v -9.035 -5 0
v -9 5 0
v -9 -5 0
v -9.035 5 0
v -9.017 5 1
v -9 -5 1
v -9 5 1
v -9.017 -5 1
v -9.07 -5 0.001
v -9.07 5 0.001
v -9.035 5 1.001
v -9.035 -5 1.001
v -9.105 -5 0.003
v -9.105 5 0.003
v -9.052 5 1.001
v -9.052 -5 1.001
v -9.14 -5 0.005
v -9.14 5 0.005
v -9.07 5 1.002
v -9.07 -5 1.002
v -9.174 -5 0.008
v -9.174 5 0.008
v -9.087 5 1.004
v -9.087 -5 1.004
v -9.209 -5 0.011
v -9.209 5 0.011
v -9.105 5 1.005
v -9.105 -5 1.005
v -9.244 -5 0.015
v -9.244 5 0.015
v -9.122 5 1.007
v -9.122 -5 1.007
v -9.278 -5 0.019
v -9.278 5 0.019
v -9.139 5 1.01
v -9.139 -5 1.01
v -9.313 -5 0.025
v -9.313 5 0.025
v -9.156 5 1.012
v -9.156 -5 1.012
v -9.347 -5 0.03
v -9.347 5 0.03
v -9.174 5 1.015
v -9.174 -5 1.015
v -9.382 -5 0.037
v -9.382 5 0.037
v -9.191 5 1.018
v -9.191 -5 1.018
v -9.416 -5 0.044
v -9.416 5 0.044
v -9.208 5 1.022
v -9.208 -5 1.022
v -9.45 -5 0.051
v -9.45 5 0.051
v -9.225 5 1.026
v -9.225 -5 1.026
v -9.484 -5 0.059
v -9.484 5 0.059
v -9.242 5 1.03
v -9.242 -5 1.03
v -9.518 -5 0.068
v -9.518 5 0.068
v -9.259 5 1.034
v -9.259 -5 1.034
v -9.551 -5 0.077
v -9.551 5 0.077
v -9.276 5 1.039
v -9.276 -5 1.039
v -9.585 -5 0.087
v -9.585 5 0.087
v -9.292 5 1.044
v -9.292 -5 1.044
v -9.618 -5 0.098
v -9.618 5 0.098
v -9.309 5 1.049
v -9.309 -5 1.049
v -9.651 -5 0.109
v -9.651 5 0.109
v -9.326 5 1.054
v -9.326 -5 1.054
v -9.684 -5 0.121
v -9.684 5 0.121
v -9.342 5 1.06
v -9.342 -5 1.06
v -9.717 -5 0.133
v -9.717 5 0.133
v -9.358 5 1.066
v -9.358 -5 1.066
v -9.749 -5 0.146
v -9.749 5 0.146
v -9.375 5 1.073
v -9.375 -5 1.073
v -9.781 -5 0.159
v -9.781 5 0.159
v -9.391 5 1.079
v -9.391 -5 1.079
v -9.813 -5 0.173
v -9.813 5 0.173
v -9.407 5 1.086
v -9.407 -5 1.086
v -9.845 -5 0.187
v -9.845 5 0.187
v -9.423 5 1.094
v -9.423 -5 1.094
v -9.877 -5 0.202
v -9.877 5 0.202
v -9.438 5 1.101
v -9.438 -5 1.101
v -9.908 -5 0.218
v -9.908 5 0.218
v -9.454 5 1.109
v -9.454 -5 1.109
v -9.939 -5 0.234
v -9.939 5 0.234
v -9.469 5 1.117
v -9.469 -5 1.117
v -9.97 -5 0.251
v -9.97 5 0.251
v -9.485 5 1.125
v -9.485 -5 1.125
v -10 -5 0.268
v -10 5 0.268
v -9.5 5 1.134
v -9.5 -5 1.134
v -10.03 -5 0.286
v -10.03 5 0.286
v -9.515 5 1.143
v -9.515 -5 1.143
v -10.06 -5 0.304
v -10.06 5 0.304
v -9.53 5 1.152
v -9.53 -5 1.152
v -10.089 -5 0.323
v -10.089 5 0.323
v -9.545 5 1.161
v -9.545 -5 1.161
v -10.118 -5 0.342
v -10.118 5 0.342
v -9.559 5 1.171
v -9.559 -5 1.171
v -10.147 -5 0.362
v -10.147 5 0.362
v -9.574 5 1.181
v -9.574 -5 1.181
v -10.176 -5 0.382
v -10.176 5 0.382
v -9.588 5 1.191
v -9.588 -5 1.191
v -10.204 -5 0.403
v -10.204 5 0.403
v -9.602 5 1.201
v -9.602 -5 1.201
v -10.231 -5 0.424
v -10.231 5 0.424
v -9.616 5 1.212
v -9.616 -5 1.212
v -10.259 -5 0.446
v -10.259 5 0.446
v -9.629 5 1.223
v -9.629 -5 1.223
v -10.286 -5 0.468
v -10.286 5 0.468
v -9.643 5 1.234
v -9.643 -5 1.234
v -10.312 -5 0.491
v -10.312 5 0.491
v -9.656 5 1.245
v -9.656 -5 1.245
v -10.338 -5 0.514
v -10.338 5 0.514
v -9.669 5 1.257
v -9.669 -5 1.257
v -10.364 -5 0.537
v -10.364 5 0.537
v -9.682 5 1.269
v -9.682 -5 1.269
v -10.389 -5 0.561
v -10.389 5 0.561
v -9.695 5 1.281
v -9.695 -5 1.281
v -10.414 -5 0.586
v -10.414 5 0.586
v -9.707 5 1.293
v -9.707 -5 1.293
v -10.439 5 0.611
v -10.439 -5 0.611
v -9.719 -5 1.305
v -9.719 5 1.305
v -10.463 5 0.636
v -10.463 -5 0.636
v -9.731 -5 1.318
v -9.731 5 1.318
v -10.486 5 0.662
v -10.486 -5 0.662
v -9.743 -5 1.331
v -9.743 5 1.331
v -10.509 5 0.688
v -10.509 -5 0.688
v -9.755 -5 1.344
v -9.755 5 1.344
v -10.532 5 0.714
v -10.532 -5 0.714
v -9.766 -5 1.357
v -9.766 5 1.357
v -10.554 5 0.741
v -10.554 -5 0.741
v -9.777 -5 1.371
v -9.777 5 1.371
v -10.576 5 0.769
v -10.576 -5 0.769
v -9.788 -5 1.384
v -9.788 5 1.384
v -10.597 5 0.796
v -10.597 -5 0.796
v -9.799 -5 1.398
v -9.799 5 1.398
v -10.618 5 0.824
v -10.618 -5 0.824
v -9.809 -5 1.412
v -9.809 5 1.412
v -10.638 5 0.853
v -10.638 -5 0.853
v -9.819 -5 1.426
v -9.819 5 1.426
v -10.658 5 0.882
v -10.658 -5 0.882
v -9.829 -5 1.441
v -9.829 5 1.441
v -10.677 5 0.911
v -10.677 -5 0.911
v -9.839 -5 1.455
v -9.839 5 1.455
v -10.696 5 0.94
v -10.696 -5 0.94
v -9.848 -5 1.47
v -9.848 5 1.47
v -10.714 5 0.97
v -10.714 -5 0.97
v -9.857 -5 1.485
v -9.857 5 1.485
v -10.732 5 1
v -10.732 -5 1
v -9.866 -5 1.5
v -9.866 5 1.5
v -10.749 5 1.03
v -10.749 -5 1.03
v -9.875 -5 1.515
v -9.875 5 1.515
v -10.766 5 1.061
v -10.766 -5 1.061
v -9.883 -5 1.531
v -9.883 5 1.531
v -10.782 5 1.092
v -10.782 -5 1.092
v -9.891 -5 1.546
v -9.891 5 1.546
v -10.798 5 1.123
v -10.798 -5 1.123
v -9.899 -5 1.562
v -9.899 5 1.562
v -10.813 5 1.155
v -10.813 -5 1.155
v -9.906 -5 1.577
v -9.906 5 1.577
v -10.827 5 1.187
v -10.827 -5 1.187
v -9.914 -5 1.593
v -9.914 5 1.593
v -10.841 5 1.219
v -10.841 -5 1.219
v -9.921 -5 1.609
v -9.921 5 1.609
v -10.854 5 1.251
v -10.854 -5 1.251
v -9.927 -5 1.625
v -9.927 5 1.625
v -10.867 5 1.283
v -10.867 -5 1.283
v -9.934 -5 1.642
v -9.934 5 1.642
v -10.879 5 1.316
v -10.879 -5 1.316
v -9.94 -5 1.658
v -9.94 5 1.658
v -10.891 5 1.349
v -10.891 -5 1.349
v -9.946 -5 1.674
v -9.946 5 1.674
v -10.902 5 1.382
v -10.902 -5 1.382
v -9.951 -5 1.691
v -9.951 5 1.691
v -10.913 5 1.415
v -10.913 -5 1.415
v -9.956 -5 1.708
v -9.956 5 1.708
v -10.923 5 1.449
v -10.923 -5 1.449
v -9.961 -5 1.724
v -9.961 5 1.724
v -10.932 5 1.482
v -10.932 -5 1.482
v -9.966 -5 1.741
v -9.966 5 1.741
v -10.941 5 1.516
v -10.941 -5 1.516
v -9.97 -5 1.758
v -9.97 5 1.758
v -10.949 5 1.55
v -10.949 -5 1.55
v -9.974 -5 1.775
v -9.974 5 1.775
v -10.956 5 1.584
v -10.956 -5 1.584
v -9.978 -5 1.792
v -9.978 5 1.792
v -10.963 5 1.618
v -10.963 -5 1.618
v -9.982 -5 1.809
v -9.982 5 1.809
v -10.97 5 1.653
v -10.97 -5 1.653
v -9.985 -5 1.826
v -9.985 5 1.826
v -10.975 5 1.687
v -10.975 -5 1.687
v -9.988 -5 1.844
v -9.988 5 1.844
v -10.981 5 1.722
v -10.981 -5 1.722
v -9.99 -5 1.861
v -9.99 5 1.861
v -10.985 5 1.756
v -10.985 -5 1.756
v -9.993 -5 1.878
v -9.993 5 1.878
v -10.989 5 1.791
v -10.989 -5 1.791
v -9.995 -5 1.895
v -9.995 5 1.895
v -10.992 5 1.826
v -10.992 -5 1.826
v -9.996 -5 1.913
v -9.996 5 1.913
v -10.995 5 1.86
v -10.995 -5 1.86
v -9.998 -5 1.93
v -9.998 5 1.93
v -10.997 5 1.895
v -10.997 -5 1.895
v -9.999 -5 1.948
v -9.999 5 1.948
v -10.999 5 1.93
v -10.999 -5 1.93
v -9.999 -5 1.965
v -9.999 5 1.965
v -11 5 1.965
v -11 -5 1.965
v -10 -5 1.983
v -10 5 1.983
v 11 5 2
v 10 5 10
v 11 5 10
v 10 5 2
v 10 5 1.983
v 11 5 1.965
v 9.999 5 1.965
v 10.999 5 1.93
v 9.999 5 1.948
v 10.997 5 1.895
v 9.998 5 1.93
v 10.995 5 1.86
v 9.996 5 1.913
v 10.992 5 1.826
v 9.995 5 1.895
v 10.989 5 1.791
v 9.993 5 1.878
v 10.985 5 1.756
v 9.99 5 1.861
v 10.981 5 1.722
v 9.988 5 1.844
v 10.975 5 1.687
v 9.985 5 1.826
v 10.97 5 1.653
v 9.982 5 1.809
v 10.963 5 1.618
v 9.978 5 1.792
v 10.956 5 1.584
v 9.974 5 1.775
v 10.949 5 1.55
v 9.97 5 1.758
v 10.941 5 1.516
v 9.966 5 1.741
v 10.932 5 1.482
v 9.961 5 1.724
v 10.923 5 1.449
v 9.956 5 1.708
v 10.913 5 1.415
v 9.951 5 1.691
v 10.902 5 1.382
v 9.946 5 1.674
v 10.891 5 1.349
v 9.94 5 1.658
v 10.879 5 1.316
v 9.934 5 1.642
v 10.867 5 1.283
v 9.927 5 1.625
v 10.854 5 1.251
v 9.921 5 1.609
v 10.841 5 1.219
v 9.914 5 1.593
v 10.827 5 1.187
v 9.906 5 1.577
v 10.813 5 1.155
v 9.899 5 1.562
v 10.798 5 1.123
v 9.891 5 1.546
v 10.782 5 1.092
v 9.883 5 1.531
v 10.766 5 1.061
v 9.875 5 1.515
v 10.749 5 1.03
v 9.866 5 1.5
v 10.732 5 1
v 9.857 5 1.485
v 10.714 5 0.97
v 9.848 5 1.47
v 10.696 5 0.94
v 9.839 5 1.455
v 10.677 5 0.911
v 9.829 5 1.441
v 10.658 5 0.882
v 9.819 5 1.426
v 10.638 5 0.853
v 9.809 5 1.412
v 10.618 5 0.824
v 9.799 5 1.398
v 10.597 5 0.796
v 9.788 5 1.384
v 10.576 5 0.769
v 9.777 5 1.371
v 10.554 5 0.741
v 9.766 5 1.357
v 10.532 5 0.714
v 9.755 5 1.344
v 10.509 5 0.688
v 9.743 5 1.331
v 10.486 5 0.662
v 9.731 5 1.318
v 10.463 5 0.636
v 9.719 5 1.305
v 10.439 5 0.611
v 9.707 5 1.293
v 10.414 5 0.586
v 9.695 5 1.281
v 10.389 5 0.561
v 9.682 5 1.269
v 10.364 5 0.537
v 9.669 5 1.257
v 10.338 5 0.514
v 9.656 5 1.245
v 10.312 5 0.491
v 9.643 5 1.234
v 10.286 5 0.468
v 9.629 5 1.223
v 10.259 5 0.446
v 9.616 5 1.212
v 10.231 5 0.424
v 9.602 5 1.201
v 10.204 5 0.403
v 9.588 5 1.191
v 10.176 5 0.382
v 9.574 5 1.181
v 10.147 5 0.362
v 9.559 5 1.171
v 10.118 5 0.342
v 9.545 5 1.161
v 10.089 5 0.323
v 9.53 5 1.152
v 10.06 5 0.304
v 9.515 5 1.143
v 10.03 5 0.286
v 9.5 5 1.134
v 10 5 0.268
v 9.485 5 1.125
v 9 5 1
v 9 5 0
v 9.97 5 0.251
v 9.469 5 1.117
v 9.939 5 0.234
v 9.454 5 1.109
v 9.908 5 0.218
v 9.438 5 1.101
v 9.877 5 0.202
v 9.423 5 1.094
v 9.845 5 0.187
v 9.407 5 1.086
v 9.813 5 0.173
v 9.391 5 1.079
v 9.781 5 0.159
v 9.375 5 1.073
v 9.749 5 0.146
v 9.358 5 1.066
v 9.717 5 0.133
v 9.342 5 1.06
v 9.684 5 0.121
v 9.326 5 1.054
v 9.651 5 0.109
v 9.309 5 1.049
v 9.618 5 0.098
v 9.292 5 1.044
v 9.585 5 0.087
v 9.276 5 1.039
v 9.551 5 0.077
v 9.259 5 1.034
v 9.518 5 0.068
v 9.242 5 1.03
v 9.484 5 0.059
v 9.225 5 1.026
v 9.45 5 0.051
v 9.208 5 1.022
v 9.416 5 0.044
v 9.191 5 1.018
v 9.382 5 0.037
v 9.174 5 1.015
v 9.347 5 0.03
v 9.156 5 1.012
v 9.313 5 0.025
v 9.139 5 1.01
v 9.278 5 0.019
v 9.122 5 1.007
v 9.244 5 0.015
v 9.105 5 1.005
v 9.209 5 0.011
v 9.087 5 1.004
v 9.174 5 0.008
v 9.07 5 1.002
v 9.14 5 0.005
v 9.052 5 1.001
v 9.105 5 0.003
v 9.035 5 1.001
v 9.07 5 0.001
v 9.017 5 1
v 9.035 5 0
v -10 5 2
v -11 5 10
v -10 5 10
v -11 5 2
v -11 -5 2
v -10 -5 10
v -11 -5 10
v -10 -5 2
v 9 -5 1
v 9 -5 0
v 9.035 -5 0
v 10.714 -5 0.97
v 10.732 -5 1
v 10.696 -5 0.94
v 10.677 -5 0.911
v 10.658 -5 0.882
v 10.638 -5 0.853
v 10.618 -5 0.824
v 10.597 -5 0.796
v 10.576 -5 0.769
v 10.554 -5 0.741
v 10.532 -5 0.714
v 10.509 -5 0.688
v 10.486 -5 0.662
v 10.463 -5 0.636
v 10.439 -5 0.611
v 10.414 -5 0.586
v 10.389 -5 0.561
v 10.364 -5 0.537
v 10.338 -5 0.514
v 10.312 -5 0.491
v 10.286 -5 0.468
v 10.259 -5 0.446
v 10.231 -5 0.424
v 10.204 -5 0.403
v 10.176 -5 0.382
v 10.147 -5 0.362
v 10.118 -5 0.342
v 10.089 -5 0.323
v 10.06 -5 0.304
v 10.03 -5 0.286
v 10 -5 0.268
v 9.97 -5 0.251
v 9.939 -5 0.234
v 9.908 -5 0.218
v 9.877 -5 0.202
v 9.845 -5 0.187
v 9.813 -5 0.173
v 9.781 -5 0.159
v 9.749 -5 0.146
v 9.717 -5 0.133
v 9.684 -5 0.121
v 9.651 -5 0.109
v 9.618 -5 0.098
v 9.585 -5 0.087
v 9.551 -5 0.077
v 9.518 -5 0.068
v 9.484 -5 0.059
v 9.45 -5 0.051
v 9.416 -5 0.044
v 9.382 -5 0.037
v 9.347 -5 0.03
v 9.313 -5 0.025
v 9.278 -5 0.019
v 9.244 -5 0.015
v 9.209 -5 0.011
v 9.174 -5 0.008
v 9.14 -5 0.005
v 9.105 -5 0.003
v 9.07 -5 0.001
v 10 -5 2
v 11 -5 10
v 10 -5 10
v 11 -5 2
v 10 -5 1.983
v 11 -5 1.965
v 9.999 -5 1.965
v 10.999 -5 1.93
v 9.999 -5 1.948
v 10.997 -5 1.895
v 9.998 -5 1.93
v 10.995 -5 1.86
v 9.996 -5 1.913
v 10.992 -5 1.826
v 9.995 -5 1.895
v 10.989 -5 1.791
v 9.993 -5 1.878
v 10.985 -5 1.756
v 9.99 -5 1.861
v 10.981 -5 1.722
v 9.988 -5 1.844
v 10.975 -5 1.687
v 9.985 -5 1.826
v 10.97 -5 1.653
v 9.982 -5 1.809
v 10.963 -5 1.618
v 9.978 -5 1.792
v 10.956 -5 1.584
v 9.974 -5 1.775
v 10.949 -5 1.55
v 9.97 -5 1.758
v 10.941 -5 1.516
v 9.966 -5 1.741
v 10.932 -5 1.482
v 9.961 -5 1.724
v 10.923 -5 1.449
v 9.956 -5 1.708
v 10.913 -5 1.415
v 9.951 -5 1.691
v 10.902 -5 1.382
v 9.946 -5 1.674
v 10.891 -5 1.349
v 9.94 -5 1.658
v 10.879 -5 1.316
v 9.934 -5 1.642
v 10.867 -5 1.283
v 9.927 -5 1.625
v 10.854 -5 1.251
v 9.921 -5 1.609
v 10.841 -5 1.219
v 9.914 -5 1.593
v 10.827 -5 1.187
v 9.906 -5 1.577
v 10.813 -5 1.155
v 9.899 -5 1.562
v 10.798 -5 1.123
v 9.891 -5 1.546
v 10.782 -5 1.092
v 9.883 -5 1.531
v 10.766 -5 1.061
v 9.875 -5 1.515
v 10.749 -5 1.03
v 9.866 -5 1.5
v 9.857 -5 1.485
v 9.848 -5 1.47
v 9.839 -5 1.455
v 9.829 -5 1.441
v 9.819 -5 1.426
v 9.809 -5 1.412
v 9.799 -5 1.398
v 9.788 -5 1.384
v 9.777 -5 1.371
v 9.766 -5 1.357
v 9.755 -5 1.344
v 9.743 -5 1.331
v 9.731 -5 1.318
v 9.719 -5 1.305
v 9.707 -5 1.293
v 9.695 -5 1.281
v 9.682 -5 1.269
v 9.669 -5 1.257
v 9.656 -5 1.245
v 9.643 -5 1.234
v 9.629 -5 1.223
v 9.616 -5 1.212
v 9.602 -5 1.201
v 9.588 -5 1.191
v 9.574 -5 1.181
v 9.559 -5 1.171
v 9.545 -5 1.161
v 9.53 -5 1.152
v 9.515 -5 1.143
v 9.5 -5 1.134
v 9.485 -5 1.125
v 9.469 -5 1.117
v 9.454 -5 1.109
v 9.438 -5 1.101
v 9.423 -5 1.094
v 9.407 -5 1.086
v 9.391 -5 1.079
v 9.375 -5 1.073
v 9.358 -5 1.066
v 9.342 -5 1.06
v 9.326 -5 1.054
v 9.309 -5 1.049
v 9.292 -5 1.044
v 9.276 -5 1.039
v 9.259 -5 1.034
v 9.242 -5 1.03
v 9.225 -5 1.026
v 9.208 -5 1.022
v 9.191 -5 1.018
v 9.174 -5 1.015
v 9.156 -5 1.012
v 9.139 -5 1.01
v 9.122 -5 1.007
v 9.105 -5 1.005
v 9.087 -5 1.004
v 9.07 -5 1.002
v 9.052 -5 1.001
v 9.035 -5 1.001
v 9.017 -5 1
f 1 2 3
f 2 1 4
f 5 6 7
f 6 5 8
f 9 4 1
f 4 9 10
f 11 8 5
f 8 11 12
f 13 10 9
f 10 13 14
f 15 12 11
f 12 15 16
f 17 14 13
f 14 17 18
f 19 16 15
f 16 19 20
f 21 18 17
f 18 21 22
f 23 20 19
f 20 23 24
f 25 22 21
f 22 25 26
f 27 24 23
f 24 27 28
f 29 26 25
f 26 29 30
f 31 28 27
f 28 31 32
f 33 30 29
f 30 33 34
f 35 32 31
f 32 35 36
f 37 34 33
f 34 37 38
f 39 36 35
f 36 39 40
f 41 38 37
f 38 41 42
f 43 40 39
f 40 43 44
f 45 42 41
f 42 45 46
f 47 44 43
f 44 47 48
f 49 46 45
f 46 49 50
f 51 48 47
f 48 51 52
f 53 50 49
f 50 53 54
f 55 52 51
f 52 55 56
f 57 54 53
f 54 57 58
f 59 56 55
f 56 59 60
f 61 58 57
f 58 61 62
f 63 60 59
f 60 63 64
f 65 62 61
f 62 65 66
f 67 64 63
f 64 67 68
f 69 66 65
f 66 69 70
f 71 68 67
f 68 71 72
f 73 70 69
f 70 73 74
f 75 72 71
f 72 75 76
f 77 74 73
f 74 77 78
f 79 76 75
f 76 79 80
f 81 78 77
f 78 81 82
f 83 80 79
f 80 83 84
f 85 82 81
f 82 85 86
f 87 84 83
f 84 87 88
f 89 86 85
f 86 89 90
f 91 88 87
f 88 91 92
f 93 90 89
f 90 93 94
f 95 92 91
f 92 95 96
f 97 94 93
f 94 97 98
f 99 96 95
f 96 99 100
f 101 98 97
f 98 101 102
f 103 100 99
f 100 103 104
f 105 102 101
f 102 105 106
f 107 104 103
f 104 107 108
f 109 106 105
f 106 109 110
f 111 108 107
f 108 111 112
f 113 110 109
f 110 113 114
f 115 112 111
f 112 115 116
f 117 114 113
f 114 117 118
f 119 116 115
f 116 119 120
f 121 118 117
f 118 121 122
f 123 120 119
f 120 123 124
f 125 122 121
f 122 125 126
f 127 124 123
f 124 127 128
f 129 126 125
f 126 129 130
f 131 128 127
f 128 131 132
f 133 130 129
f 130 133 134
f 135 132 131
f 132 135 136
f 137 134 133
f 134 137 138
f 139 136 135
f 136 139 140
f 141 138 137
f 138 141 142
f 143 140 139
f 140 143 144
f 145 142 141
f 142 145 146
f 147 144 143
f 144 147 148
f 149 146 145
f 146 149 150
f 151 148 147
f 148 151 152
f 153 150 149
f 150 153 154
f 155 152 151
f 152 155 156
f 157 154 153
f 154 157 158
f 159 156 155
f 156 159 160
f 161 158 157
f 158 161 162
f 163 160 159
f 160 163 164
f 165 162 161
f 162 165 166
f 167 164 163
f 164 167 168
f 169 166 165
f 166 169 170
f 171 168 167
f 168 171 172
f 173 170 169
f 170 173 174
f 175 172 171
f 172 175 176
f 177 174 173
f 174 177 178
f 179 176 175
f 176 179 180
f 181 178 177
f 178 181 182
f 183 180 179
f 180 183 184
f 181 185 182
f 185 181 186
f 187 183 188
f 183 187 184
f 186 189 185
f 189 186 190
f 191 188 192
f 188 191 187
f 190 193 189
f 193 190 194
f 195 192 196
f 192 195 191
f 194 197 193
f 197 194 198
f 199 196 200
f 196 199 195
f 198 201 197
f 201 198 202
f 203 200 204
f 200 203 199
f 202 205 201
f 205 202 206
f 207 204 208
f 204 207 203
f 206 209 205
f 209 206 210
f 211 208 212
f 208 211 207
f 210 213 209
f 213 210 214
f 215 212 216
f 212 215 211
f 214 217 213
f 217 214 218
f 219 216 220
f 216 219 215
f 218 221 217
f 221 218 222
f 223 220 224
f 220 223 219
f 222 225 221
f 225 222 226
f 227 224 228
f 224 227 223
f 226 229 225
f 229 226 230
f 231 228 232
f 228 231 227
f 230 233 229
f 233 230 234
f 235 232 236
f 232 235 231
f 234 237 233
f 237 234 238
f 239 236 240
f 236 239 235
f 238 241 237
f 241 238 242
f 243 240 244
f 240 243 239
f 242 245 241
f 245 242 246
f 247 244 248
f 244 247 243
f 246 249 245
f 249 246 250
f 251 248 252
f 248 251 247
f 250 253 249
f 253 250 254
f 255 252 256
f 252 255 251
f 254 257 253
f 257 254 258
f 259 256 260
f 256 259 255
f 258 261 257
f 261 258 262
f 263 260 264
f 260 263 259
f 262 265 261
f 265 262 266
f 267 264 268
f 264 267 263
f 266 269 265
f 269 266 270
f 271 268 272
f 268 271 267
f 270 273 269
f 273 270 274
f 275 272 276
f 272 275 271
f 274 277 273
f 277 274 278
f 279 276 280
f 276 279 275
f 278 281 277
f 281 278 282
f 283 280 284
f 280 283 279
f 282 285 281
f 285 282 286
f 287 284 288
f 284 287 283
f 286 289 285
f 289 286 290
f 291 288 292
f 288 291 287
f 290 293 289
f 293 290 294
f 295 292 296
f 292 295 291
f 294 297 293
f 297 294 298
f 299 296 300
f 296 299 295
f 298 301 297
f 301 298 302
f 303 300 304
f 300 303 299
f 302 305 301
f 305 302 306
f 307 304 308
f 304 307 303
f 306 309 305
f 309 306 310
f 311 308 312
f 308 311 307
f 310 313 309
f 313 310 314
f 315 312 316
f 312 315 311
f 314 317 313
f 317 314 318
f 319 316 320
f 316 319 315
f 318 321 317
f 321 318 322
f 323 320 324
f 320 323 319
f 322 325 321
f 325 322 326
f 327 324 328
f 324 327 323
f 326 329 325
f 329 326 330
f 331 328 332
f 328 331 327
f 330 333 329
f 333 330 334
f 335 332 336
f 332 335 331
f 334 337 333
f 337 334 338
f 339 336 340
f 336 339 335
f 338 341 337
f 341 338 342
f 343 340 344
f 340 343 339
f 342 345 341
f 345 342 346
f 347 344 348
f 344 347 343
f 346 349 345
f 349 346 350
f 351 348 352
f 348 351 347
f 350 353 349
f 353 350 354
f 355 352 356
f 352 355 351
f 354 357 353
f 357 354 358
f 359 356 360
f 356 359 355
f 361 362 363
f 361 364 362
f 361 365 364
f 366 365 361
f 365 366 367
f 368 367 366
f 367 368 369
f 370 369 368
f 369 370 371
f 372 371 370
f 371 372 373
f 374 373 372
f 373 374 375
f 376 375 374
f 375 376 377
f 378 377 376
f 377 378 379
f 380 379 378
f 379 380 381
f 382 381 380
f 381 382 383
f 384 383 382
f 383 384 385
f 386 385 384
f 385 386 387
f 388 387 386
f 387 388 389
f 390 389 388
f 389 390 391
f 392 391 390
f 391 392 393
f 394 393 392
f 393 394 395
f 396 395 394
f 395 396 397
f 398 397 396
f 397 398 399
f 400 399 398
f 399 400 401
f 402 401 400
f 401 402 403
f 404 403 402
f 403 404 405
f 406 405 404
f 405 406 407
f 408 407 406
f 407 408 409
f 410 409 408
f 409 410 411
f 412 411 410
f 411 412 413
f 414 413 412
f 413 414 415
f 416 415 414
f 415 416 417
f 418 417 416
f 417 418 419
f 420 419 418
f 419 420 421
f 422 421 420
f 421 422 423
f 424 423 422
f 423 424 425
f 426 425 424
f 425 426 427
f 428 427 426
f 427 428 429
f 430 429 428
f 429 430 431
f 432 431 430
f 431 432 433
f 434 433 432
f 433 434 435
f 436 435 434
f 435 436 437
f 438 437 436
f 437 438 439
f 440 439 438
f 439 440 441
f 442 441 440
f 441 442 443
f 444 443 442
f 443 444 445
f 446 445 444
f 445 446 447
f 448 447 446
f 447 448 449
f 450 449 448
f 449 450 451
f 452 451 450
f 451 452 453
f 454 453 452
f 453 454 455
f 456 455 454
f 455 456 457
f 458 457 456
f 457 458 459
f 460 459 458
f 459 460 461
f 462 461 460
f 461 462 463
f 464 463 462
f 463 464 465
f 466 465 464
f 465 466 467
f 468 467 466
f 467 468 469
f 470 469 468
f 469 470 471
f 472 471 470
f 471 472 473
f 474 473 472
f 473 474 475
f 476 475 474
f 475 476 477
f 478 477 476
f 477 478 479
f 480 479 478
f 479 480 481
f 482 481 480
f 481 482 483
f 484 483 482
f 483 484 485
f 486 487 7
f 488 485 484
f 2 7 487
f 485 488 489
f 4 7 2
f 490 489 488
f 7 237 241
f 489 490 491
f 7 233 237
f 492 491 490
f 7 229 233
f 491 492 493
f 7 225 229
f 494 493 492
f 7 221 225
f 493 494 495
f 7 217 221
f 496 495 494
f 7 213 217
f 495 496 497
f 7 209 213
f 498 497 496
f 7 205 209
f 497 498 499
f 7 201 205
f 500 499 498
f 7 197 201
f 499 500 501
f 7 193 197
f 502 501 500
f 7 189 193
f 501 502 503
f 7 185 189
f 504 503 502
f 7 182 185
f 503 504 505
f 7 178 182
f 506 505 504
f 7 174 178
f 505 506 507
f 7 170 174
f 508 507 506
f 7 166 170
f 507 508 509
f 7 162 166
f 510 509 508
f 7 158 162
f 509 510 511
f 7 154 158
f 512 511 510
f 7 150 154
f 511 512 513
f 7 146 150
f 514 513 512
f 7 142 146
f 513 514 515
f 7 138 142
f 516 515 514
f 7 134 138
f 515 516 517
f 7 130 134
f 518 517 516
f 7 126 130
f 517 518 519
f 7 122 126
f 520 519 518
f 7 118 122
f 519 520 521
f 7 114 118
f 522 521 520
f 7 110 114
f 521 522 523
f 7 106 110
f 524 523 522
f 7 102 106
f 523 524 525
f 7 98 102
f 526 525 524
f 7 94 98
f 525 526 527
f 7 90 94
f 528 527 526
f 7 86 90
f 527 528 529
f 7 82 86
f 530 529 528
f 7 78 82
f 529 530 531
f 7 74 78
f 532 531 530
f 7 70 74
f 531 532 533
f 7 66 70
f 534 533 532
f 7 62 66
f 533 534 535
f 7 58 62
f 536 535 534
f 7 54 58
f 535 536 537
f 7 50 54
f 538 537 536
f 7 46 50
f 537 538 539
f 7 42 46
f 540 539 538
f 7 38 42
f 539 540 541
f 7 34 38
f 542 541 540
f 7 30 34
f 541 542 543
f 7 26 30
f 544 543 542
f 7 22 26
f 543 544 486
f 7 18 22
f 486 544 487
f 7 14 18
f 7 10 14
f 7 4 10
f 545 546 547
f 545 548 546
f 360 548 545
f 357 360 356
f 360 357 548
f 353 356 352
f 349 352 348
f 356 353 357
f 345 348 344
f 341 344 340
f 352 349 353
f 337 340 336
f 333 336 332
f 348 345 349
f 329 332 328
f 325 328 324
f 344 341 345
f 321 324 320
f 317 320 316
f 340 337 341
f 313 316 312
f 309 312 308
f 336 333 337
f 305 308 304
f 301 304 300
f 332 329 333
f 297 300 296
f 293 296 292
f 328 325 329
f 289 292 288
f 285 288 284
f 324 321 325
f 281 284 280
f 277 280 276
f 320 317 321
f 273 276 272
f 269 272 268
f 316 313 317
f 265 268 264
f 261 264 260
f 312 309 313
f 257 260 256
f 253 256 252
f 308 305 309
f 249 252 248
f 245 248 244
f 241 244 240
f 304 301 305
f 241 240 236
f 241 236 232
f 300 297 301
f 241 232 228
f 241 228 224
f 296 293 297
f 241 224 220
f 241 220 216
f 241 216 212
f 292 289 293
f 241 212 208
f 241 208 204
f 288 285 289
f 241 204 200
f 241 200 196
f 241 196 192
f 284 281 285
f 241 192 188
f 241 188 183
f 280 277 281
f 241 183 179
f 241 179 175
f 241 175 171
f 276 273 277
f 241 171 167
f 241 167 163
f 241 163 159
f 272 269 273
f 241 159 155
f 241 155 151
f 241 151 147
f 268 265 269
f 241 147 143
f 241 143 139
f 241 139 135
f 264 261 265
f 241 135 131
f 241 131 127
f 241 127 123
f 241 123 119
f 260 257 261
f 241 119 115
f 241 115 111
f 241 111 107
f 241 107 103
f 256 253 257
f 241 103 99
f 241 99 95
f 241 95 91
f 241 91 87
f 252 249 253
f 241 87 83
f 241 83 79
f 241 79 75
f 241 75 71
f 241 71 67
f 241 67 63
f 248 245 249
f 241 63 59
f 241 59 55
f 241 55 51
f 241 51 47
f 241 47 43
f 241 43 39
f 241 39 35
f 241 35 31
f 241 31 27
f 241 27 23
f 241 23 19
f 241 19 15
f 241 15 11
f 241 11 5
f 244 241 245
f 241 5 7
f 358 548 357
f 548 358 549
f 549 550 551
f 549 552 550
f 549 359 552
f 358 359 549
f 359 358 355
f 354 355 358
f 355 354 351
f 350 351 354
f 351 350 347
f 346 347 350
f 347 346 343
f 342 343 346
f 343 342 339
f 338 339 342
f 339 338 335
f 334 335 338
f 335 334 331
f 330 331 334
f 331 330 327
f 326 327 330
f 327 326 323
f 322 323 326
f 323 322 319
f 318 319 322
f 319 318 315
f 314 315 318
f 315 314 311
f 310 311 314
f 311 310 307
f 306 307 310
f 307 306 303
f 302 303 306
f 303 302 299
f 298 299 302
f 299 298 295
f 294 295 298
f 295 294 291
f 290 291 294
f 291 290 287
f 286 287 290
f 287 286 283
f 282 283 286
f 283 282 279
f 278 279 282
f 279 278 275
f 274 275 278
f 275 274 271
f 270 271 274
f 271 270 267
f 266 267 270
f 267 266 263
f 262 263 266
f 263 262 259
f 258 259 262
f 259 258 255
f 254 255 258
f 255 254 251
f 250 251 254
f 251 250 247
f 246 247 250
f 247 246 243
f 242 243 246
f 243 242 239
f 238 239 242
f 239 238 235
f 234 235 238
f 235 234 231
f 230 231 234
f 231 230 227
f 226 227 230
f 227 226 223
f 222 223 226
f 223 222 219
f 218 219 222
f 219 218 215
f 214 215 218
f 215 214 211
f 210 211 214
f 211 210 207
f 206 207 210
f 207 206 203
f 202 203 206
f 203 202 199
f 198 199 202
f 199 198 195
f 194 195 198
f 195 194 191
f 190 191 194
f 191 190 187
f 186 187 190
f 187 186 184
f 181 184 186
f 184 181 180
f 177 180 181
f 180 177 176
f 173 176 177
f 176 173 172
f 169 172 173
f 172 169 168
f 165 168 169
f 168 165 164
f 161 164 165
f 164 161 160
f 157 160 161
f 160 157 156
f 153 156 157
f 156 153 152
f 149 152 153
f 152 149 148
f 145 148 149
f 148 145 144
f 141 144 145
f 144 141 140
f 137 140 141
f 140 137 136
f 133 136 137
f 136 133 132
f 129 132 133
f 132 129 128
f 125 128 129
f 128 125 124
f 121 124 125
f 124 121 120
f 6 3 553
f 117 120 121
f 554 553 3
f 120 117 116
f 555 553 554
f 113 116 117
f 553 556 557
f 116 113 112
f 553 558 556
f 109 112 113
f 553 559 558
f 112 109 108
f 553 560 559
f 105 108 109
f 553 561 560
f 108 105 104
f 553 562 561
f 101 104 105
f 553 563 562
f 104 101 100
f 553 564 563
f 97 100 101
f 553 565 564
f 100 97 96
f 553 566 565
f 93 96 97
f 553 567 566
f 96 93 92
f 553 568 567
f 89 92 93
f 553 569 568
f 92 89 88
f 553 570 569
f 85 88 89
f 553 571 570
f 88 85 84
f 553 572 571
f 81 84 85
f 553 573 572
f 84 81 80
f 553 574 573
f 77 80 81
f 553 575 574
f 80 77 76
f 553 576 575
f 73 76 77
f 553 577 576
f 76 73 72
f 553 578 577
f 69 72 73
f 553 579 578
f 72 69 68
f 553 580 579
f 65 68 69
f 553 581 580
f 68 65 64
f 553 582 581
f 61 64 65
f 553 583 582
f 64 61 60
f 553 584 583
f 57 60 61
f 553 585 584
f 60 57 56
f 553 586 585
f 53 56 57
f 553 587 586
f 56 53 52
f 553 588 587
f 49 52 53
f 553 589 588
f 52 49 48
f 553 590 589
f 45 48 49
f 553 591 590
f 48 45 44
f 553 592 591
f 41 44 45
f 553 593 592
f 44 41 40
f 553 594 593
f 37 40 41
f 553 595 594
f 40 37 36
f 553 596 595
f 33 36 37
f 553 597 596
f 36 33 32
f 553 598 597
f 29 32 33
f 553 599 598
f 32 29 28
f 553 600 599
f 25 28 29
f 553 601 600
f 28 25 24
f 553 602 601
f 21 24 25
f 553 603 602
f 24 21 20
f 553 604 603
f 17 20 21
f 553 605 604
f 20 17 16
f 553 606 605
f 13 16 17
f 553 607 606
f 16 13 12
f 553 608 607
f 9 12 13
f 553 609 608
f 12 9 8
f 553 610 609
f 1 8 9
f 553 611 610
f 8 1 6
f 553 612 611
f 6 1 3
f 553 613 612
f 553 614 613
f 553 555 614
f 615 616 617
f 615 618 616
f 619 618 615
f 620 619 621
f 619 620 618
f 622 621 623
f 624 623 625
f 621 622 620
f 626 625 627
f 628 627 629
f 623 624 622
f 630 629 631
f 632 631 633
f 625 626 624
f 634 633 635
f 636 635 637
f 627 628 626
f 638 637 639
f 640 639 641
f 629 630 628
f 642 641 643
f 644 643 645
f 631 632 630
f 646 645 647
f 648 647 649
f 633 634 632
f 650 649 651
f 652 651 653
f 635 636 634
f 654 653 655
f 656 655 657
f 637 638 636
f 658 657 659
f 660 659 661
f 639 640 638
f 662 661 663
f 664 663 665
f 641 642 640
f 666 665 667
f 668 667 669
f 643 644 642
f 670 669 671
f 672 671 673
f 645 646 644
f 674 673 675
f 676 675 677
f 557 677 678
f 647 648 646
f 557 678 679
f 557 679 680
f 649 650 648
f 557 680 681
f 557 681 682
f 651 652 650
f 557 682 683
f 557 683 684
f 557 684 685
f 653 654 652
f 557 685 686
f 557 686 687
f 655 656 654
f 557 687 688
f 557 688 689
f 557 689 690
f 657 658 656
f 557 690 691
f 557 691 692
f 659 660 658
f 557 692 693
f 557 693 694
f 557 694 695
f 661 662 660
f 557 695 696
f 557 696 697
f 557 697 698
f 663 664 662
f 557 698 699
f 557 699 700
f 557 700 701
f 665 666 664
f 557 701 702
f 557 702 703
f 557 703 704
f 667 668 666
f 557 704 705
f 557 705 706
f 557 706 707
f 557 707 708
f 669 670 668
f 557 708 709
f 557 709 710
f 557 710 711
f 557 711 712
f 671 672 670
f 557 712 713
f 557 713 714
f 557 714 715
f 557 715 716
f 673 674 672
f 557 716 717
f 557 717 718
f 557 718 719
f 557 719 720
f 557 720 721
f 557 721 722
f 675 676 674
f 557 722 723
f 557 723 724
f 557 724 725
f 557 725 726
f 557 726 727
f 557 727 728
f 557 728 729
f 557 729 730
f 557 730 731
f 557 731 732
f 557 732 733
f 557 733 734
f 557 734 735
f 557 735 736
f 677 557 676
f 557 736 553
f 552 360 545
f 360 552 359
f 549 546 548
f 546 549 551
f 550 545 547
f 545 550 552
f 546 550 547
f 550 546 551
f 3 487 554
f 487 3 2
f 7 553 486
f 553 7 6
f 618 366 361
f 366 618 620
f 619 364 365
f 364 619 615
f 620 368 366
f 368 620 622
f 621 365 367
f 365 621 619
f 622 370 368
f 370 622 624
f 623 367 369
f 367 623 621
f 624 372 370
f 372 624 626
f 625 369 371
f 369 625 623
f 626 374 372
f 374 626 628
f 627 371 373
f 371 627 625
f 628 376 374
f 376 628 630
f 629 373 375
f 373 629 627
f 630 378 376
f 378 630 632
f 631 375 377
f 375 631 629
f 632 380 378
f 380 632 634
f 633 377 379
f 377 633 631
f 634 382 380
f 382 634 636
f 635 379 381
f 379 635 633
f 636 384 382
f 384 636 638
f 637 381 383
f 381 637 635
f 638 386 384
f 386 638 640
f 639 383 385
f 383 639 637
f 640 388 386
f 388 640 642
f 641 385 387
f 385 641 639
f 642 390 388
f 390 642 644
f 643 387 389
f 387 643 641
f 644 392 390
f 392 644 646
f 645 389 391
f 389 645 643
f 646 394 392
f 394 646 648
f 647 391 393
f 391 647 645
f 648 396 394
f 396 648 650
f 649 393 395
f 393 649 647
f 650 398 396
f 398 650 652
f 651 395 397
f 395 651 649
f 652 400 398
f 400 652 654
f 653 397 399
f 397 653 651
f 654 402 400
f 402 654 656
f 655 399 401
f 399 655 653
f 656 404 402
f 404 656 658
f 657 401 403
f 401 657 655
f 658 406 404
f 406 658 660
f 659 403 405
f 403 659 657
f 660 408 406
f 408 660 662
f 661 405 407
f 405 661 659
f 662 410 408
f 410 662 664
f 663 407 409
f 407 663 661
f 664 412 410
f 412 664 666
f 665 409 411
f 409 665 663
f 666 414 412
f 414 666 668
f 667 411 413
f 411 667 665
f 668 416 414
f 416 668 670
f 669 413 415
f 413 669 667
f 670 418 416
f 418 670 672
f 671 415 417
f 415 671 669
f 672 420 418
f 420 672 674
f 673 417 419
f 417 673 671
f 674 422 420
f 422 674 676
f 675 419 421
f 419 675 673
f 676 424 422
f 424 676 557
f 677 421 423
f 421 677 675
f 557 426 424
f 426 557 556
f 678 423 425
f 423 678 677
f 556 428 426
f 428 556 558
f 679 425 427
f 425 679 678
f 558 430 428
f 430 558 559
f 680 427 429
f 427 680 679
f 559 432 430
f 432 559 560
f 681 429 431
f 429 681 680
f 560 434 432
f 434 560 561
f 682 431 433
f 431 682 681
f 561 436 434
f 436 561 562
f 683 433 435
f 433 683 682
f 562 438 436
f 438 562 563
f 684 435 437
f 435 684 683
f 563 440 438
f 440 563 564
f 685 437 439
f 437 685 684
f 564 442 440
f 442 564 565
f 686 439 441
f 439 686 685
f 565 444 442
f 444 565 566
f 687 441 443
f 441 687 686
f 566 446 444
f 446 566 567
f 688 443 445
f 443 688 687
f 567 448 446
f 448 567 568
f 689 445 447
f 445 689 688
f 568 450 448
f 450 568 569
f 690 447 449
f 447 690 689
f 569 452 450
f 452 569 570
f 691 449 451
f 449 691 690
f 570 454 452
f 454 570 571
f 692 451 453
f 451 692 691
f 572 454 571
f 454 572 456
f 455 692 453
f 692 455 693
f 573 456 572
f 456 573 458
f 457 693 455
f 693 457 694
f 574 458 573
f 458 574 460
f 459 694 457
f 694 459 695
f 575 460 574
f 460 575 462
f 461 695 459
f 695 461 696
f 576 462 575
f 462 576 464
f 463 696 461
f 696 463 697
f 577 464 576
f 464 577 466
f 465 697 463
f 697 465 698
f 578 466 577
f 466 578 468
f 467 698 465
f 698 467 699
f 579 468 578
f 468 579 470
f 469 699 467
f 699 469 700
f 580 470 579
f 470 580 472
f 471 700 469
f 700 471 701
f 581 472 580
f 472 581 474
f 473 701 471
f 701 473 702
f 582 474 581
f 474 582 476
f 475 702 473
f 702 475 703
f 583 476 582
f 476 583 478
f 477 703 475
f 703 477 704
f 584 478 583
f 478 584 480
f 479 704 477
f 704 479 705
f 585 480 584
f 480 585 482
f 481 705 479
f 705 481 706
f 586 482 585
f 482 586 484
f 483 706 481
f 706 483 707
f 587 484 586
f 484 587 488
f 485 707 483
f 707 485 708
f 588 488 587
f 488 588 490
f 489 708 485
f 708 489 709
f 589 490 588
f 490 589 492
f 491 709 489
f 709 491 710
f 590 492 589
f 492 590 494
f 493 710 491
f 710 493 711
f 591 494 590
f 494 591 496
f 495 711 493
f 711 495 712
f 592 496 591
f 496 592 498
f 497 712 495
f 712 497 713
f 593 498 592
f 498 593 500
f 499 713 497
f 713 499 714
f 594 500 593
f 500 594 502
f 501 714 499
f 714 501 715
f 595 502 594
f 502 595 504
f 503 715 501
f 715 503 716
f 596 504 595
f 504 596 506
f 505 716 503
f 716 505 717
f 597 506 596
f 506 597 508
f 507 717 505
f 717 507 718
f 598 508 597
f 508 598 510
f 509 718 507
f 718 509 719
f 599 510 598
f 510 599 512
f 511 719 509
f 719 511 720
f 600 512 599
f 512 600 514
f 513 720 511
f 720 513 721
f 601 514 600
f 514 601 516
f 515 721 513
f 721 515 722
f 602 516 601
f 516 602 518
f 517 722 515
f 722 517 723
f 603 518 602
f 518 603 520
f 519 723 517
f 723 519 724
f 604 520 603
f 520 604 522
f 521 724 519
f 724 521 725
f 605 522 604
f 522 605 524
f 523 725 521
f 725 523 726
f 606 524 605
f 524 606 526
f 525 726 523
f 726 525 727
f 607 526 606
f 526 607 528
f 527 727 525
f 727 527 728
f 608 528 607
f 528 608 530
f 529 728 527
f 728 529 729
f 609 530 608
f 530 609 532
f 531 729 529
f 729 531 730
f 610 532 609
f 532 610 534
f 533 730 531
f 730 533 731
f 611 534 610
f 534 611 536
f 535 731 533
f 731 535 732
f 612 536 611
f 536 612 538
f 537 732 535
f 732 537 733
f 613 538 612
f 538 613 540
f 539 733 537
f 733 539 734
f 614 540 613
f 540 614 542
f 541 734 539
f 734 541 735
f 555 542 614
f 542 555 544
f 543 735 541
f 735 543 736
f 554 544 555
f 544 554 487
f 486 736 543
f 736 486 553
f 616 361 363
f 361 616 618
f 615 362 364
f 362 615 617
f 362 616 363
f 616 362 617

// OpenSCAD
$fn = 360;

module sheet_bend_example(length, angle, radius, width, thickness) {
    translate(v = [(length[1] / 2) - thickness,-width / 2,max(length[0], length[2])])
    rotate(a = -90, v = [1,0,0])  bends(length, angle, radius, width, thickness);
}

module bends(length, angle, radius, width, thickness, i=0) {
    if (i < len(length)) {
        offset = i==0 ? 2*thickness*sin(angle[i]) : 2*thickness*sin(angle[i])+2*thickness*sin(angle[i-1]);
        cube([thickness, length[i]-offset, width]);
        translate([-radius, length[i]-offset]) {
            rotate_extrude(angle = angle[i]) translate([radius,0,0]) square([thickness,width]);
            rotate([0,0,angle[i]]) translate([radius,0,0]) bends(length, angle, radius, width, thickness, i+1);
        }
    }
}

t = 1;
r = t;

w = 10;
l = [10, 20 + (t * 2), 10];
a = [90, 90, 0];

sheet_bend_example(l, a, r, w, t);
